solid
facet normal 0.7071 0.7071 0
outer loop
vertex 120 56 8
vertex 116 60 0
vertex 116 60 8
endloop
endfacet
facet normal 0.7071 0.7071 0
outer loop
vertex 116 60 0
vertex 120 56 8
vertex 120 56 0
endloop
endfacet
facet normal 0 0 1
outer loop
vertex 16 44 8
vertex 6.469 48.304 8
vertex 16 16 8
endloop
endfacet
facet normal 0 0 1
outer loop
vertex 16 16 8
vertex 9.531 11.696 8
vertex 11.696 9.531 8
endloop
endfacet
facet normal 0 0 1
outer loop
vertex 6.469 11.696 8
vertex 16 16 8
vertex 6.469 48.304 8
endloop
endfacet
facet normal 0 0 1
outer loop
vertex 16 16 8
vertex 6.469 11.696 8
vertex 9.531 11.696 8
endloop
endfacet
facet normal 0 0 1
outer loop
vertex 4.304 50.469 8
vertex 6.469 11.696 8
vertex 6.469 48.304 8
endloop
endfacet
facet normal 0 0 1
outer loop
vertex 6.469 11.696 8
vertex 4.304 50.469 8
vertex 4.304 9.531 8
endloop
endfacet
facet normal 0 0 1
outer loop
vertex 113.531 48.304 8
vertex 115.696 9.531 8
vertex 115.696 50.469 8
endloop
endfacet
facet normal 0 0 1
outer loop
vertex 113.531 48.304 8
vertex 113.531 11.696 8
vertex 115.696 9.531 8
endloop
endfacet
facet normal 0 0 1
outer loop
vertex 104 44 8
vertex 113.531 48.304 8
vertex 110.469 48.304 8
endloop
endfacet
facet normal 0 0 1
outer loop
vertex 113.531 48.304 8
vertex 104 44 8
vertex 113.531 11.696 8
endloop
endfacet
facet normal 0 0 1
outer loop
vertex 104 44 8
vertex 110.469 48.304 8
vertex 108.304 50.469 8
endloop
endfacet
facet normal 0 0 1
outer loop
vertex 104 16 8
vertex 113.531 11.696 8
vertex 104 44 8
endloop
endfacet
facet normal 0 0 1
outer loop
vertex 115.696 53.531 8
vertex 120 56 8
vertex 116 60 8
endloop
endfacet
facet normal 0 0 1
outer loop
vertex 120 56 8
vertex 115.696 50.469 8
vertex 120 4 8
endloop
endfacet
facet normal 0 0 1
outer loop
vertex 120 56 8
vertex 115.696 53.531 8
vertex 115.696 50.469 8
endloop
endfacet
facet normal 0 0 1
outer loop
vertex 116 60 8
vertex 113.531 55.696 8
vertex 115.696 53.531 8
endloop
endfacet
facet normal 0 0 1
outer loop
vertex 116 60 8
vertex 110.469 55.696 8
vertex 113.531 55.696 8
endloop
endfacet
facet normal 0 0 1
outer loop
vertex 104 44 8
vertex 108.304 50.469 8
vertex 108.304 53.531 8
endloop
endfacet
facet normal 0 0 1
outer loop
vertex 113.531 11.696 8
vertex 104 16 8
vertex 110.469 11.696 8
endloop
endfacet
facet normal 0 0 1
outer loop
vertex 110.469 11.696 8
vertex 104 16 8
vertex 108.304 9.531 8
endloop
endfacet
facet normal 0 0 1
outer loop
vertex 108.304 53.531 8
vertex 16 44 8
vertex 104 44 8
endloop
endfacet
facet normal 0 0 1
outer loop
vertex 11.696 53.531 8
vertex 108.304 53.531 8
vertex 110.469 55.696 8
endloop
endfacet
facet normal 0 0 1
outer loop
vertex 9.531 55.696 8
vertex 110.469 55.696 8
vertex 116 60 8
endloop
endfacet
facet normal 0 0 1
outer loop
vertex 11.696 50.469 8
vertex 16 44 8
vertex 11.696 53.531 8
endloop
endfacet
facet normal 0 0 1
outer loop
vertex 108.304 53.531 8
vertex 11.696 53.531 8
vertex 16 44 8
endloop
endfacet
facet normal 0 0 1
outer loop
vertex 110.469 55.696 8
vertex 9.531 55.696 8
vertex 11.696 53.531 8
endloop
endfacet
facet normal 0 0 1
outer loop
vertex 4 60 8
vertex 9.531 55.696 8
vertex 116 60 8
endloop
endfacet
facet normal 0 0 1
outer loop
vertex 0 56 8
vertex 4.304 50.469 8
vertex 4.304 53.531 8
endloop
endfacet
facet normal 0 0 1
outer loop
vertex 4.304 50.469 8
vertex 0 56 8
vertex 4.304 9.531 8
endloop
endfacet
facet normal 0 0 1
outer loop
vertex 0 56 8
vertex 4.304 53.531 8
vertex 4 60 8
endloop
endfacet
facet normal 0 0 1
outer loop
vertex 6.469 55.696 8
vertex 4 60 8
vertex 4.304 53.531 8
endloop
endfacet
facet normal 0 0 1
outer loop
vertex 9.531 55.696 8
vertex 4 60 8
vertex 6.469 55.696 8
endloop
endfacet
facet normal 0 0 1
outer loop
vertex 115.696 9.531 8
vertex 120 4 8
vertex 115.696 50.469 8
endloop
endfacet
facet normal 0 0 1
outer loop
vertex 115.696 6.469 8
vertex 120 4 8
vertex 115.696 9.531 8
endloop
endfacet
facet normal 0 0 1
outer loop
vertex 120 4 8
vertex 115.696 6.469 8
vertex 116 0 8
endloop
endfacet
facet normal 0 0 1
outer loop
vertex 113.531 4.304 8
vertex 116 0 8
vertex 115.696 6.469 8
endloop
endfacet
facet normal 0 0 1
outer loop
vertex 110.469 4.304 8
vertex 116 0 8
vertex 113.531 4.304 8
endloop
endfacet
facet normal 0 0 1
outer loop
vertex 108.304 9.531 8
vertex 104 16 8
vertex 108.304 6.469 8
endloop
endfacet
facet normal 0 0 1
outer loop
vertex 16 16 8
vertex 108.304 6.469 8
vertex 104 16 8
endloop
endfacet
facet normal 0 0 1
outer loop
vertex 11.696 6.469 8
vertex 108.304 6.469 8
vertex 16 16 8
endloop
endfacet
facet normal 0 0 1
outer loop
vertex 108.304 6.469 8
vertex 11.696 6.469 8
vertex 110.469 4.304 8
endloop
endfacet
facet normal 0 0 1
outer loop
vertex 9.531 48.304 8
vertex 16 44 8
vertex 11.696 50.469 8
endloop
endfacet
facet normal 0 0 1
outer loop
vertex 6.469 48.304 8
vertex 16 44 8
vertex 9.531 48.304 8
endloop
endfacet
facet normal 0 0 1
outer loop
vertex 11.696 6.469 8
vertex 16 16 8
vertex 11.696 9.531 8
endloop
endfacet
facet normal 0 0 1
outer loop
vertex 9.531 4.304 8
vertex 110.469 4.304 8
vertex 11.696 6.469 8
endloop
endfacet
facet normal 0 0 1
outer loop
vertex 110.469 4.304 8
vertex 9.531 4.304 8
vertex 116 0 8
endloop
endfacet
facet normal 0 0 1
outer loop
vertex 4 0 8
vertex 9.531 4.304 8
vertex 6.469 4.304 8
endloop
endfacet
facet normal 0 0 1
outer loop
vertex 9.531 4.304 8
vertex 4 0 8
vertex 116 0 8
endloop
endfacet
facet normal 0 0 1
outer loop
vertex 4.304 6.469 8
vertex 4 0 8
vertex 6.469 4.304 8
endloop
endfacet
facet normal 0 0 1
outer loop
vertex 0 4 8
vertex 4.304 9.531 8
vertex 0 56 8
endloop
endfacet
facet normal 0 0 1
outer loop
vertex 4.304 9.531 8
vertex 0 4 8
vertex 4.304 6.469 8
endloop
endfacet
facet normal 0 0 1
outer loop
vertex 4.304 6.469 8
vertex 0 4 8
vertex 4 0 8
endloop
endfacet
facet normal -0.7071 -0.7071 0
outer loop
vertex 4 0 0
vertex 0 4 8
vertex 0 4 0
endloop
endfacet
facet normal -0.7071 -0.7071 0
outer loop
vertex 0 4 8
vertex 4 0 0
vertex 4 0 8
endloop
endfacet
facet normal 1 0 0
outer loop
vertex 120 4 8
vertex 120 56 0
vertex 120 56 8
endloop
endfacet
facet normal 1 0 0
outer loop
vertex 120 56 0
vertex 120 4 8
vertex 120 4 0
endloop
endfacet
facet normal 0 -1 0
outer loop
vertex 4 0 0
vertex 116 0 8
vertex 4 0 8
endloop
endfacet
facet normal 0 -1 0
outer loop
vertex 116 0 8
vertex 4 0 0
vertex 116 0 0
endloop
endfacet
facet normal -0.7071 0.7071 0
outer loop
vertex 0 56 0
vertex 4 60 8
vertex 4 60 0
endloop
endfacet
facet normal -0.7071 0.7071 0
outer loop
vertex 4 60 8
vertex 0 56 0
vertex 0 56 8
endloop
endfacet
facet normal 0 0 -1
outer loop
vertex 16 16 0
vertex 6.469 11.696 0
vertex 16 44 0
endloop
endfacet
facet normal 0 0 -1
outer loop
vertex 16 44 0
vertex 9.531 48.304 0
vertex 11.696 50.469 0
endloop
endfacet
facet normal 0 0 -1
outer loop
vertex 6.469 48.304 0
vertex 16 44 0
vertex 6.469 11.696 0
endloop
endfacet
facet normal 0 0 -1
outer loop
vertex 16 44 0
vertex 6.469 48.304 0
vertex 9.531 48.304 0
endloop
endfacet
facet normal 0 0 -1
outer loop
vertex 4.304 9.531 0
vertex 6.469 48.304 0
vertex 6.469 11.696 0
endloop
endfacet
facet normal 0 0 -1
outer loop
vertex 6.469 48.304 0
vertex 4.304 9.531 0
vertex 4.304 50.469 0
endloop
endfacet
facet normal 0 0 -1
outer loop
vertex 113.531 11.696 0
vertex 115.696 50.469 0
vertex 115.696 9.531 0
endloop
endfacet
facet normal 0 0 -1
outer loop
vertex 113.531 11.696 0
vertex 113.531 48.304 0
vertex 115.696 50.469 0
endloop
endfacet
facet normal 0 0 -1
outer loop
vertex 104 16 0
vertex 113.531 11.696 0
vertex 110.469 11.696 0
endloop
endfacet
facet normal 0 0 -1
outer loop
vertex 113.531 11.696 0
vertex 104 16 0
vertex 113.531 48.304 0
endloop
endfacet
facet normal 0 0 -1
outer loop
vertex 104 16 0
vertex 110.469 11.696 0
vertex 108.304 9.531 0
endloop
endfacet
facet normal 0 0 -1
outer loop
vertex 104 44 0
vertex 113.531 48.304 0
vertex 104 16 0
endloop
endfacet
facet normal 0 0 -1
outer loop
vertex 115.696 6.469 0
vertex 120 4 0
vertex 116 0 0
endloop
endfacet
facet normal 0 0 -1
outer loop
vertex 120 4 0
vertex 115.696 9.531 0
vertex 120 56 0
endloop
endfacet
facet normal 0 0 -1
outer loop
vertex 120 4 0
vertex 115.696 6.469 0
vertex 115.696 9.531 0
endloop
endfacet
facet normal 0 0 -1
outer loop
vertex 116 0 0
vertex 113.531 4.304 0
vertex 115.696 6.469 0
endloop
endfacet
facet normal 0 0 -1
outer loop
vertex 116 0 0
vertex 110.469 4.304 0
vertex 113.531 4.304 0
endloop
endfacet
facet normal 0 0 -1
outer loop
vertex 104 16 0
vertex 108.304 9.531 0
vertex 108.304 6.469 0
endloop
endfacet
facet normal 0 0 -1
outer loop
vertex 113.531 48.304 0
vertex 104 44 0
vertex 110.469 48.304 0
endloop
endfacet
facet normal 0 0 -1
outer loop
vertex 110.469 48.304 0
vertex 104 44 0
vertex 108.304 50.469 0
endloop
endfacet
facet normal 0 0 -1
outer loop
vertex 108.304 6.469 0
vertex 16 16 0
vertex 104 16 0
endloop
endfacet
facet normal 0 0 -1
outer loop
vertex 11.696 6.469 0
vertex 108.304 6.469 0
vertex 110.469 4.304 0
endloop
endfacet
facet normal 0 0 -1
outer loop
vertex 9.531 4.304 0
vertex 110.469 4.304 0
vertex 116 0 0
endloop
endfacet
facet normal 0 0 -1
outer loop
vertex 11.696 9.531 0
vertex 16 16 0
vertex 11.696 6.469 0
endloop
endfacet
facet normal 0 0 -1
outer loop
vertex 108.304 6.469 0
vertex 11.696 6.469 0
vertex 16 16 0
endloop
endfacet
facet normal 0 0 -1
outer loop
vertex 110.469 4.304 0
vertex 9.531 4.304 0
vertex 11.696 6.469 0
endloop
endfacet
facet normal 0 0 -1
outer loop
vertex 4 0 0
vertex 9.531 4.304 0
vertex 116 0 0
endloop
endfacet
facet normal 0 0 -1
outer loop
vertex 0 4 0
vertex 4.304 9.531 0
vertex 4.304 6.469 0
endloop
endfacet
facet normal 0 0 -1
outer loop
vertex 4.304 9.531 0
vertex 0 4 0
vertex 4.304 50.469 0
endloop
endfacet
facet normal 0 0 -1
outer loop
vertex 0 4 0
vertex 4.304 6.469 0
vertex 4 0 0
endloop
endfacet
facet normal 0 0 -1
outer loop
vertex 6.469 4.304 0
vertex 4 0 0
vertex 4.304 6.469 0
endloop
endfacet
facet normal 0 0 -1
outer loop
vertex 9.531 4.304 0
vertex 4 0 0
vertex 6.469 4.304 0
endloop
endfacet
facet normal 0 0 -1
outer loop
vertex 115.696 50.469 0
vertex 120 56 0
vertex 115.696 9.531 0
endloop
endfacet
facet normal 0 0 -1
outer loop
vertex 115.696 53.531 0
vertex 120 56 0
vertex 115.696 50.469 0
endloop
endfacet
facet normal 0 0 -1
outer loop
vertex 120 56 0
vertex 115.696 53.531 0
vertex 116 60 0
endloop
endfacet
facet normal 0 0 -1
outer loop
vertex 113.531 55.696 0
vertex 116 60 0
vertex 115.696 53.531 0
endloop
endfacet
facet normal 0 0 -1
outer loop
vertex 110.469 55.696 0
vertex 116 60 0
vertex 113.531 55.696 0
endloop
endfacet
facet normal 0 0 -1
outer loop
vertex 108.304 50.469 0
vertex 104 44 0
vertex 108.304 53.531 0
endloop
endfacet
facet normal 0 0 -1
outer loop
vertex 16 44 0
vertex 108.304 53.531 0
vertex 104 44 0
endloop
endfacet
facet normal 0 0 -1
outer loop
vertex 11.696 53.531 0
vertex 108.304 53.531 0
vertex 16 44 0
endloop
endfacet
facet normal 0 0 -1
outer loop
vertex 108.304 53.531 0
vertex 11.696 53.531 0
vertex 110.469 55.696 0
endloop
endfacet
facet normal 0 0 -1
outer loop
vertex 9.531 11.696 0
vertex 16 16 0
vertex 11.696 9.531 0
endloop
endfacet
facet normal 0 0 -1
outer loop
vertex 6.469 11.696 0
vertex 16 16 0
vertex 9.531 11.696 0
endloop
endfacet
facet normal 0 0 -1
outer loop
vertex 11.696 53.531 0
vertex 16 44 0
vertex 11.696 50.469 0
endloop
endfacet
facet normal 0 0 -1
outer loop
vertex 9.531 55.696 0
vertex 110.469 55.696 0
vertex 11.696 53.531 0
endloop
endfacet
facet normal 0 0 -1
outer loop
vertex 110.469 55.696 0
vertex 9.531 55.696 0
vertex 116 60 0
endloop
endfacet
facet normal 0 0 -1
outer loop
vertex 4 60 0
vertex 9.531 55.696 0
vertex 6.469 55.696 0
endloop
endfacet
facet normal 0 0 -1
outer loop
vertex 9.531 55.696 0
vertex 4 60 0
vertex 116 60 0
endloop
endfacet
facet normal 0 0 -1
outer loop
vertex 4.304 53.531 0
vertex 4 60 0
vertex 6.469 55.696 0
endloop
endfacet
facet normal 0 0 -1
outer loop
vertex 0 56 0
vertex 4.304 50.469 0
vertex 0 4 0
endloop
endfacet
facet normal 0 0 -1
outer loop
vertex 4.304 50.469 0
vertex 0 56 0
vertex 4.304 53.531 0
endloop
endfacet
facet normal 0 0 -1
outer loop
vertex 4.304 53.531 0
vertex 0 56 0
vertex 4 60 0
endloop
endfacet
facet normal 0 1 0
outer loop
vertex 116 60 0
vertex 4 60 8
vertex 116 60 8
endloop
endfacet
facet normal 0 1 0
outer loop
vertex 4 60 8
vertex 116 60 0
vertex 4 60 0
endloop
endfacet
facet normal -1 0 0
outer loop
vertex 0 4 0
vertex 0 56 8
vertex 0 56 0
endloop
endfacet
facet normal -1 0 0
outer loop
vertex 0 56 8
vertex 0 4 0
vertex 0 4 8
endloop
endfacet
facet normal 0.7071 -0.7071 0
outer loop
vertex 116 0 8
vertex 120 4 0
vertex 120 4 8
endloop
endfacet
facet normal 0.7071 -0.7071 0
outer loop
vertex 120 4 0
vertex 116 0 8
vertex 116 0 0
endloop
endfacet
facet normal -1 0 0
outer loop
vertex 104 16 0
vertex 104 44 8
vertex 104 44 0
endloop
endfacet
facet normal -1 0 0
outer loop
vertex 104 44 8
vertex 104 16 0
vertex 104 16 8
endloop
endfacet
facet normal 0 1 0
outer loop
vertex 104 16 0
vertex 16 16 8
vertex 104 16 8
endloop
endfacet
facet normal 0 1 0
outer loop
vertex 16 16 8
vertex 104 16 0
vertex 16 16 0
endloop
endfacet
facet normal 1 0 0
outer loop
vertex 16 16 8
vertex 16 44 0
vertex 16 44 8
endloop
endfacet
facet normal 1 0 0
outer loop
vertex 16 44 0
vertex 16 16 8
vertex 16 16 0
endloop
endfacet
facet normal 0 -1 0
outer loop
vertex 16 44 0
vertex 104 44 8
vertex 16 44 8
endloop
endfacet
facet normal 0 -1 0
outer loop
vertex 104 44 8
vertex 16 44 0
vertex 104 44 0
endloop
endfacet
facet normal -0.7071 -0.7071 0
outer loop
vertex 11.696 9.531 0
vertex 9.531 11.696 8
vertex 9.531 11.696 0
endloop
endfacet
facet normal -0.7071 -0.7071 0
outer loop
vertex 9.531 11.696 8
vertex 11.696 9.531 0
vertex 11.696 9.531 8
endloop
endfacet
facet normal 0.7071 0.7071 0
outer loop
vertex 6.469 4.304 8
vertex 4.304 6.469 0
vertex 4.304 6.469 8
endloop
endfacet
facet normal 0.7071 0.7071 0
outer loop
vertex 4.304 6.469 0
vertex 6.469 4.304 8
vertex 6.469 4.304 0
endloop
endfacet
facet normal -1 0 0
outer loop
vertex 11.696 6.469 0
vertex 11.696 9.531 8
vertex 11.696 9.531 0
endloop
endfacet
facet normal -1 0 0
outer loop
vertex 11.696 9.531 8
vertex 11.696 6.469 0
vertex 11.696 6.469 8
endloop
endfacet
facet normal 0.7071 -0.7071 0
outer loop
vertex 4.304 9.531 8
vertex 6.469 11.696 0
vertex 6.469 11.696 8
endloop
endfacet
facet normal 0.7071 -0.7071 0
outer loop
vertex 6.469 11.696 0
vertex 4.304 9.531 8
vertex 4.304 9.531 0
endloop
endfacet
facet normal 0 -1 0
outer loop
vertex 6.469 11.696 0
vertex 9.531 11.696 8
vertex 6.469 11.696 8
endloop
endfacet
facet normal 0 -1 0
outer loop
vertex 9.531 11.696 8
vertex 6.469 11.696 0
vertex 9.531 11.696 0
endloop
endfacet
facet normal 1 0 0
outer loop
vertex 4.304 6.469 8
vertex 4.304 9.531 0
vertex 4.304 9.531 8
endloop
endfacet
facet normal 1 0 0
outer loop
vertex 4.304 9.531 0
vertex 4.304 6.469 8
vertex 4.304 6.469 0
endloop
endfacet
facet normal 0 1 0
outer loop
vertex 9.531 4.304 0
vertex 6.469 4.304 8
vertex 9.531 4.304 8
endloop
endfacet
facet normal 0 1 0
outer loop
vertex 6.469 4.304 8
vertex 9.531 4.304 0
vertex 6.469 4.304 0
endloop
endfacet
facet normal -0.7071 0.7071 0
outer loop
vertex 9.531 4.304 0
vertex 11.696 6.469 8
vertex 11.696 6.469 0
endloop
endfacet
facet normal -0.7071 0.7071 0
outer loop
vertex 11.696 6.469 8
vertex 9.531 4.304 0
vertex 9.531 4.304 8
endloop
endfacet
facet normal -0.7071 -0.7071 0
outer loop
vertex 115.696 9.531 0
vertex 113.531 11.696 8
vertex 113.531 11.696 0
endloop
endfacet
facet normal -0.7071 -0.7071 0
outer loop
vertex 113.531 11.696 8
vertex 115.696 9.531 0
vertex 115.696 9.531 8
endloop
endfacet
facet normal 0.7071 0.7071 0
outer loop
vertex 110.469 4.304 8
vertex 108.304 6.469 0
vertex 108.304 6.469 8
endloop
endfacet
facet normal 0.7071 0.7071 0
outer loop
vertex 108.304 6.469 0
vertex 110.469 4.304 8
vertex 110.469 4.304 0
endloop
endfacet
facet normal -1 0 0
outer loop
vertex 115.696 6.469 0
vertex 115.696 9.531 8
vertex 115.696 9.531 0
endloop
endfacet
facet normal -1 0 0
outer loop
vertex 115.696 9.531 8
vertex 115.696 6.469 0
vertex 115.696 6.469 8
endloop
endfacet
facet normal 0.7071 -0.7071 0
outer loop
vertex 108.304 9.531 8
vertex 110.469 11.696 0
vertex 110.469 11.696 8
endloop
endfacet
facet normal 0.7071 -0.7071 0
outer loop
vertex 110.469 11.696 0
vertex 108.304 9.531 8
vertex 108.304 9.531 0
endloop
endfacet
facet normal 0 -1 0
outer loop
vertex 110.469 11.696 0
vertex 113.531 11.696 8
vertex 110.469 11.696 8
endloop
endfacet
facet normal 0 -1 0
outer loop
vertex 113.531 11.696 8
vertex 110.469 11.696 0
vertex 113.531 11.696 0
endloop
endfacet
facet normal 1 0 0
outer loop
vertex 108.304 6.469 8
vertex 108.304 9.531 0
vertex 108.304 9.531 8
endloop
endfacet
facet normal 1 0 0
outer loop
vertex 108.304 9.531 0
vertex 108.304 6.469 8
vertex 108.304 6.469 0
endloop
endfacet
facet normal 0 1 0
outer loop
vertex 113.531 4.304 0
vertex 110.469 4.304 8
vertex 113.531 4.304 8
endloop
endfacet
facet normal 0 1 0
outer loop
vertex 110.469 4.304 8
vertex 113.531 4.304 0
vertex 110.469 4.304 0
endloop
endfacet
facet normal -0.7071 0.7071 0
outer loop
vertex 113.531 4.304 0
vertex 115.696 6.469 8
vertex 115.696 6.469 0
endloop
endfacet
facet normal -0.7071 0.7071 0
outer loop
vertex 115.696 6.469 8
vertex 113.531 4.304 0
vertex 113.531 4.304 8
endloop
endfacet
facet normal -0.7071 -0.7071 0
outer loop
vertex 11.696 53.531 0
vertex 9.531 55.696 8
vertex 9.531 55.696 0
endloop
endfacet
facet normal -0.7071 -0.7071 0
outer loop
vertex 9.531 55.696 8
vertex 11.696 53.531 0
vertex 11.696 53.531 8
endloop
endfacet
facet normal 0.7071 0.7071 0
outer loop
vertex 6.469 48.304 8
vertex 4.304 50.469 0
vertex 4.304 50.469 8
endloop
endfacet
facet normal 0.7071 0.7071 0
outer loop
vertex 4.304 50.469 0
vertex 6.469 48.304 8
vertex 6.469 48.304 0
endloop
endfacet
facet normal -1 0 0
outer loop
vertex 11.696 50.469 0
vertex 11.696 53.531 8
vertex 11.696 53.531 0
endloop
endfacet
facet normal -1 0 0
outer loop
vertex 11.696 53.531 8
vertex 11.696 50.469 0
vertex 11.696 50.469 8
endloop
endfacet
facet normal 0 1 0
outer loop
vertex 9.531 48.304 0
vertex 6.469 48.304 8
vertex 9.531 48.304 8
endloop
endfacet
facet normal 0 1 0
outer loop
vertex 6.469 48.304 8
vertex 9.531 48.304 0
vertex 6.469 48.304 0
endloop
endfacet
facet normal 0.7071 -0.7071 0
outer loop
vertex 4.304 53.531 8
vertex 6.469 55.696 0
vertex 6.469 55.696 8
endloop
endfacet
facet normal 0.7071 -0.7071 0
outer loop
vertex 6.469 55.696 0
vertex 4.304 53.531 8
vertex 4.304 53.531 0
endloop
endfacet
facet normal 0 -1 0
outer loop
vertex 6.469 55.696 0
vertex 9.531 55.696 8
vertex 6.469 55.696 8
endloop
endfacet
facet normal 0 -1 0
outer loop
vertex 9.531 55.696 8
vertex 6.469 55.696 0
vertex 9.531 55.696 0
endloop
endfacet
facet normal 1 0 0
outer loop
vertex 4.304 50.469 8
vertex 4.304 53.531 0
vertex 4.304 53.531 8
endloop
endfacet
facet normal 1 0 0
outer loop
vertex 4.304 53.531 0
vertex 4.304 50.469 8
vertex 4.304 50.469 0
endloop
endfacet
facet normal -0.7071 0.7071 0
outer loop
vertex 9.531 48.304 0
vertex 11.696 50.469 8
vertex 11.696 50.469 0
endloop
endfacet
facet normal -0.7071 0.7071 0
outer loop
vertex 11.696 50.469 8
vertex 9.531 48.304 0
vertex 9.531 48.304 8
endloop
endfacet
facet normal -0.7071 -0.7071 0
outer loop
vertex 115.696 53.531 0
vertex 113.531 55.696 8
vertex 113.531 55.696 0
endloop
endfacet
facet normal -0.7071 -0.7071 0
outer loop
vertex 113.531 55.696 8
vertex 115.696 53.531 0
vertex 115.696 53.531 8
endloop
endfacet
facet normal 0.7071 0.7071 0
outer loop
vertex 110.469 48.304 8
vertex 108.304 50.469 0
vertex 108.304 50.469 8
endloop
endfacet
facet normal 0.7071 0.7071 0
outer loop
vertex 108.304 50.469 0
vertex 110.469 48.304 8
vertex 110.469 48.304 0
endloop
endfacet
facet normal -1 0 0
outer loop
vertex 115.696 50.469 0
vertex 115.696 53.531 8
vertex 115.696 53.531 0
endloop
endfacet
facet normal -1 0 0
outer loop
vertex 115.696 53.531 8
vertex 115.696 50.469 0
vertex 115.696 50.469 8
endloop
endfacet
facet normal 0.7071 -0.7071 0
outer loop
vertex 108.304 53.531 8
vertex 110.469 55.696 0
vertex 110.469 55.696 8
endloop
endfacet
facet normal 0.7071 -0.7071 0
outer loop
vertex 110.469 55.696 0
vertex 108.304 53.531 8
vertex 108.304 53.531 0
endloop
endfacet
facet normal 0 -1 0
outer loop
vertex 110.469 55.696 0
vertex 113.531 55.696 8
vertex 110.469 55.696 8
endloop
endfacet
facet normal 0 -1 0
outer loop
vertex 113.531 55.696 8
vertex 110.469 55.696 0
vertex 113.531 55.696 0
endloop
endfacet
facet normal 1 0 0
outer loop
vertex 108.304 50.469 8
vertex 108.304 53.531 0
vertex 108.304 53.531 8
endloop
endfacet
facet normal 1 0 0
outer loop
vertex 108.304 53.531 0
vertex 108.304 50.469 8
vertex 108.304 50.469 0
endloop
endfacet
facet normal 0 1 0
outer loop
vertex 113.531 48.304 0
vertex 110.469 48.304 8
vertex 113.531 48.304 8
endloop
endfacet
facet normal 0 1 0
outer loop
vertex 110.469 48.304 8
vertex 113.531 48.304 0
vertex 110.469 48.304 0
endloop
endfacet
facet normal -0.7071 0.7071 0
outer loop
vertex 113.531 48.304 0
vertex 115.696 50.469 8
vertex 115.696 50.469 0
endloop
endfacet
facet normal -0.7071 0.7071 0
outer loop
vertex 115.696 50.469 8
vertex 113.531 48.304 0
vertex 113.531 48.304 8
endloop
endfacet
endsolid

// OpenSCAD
$fn = 32;

// ----------------------------------------------------------------------
// Frame plate: 120 x 60 frame, 16 mm rails
// ----------------------------------------------------------------------

// --- parameters (mm) ---
plate_l = 120;            // plate length, X
plate_w = 60;             // plate width, Y
plate_t = 8;              // plate thickness, Z (extrusion height)
corner_c = 4;             // corner chamfer
frame_bar = 16;           // frame rail width
bolt_r = 4;               // corner bolt window radius
bolt_inset = 8;           // bolt centre inset from the edges
fit_tol = 0.1;            // declared fit tolerance (prompt contract)
free_tol = 0.3;           // declared free tolerance (prompt contract)

win_l = plate_l - 2 * frame_bar;  // window length
win_w = plate_w - 2 * frame_bar;  // window width
bolt_d = 2 * bolt_r;  // corner hole diameter

profile = [[4, 0], [116, 0], [120, 4], [120, 56], [116, 60], [4, 60], [0, 56], [0, 4]];  // primary outline, 8 points, counter clockwise
void_1 = [[16, 16], [104, 16], [104, 44], [16, 44]];  // the window, 4 points
void_2 = [[11.696, 9.531], [9.531, 11.696], [6.469, 11.696], [4.304, 9.531], [4.304, 6.469], [6.469, 4.304], [9.531, 4.304], [11.696, 6.469]];  // corner bolt window, 8 points
void_3 = [[115.696, 9.531], [113.531, 11.696], [110.469, 11.696], [108.304, 9.531], [108.304, 6.469], [110.469, 4.304], [113.531, 4.304], [115.696, 6.469]];  // corner bolt window, 8 points
void_4 = [[11.696, 53.531], [9.531, 55.696], [6.469, 55.696], [4.304, 53.531], [4.304, 50.469], [6.469, 48.304], [9.531, 48.304], [11.696, 50.469]];  // corner bolt window, 8 points
void_5 = [[115.696, 53.531], [113.531, 55.696], [110.469, 55.696], [108.304, 53.531], [108.304, 50.469], [110.469, 48.304], [113.531, 48.304], [115.696, 50.469]];  // corner bolt window, 8 points

// --- the one profile operation ---
difference() {
  linear_extrude(height = plate_t) polygon(points = profile);
  translate([0, 0, -1])
    linear_extrude(height = plate_t + 2) polygon(points = void_1);
  translate([0, 0, -1])
    linear_extrude(height = plate_t + 2) polygon(points = void_2);
  translate([0, 0, -1])
    linear_extrude(height = plate_t + 2) polygon(points = void_3);
  translate([0, 0, -1])
    linear_extrude(height = plate_t + 2) polygon(points = void_4);
  translate([0, 0, -1])
    linear_extrude(height = plate_t + 2) polygon(points = void_5);
}
